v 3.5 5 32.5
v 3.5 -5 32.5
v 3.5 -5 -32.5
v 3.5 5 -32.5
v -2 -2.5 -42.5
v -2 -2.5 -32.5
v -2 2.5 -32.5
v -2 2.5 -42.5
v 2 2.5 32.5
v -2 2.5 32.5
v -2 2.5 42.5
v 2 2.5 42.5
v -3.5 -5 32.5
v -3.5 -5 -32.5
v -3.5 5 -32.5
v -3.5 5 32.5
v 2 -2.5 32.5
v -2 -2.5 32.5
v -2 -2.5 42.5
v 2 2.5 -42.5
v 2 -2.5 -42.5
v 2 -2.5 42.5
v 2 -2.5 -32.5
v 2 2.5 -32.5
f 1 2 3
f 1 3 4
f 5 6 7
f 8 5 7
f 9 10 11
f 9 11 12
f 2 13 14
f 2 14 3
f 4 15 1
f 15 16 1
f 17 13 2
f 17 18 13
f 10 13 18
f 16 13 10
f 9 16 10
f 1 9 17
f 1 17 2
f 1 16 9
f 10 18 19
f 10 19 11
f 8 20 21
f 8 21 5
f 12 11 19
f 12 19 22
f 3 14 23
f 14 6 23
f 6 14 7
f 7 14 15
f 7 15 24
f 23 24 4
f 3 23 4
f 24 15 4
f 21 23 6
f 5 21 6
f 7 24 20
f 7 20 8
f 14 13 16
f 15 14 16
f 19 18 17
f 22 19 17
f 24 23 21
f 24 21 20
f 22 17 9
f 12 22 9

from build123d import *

# Parameters (mm, degrees)
SKETCH1_W           = 7
SKETCH1_H           = 10
BOSS_EXTRUDE1_DEPTH = 32.5
SKETCH2_W           = 4
SKETCH2_H           = 5
BOSS_EXTRUDE2_DEPTH = 10
SKETCH3_W           = 4
SKETCH3_H           = 5
BOSS_EXTRUDE3_DEPTH = 10


with BuildPart() as part:
    # Sketch1 → Boss-Extrude1 (new body, symmetric)
    with BuildSketch(Plane.XY):
        Rectangle(SKETCH1_W, SKETCH1_H)
    extrude(amount=BOSS_EXTRUDE1_DEPTH, both=True)

    # Sketch2 → Boss-Extrude2 (add)
    with BuildSketch(Plane.XY.offset(32.5)):
        Rectangle(SKETCH2_W, SKETCH2_H)
    extrude(amount=BOSS_EXTRUDE2_DEPTH)

    # Sketch3 → Boss-Extrude3 (add)
    with BuildSketch(Plane(origin=(0, 0, -32.5), x_dir=(-1, 0, 0), z_dir=(0, 0, -1))):
        Rectangle(SKETCH3_W, SKETCH3_H)
    extrude(amount=BOSS_EXTRUDE3_DEPTH)


solid = part.part
